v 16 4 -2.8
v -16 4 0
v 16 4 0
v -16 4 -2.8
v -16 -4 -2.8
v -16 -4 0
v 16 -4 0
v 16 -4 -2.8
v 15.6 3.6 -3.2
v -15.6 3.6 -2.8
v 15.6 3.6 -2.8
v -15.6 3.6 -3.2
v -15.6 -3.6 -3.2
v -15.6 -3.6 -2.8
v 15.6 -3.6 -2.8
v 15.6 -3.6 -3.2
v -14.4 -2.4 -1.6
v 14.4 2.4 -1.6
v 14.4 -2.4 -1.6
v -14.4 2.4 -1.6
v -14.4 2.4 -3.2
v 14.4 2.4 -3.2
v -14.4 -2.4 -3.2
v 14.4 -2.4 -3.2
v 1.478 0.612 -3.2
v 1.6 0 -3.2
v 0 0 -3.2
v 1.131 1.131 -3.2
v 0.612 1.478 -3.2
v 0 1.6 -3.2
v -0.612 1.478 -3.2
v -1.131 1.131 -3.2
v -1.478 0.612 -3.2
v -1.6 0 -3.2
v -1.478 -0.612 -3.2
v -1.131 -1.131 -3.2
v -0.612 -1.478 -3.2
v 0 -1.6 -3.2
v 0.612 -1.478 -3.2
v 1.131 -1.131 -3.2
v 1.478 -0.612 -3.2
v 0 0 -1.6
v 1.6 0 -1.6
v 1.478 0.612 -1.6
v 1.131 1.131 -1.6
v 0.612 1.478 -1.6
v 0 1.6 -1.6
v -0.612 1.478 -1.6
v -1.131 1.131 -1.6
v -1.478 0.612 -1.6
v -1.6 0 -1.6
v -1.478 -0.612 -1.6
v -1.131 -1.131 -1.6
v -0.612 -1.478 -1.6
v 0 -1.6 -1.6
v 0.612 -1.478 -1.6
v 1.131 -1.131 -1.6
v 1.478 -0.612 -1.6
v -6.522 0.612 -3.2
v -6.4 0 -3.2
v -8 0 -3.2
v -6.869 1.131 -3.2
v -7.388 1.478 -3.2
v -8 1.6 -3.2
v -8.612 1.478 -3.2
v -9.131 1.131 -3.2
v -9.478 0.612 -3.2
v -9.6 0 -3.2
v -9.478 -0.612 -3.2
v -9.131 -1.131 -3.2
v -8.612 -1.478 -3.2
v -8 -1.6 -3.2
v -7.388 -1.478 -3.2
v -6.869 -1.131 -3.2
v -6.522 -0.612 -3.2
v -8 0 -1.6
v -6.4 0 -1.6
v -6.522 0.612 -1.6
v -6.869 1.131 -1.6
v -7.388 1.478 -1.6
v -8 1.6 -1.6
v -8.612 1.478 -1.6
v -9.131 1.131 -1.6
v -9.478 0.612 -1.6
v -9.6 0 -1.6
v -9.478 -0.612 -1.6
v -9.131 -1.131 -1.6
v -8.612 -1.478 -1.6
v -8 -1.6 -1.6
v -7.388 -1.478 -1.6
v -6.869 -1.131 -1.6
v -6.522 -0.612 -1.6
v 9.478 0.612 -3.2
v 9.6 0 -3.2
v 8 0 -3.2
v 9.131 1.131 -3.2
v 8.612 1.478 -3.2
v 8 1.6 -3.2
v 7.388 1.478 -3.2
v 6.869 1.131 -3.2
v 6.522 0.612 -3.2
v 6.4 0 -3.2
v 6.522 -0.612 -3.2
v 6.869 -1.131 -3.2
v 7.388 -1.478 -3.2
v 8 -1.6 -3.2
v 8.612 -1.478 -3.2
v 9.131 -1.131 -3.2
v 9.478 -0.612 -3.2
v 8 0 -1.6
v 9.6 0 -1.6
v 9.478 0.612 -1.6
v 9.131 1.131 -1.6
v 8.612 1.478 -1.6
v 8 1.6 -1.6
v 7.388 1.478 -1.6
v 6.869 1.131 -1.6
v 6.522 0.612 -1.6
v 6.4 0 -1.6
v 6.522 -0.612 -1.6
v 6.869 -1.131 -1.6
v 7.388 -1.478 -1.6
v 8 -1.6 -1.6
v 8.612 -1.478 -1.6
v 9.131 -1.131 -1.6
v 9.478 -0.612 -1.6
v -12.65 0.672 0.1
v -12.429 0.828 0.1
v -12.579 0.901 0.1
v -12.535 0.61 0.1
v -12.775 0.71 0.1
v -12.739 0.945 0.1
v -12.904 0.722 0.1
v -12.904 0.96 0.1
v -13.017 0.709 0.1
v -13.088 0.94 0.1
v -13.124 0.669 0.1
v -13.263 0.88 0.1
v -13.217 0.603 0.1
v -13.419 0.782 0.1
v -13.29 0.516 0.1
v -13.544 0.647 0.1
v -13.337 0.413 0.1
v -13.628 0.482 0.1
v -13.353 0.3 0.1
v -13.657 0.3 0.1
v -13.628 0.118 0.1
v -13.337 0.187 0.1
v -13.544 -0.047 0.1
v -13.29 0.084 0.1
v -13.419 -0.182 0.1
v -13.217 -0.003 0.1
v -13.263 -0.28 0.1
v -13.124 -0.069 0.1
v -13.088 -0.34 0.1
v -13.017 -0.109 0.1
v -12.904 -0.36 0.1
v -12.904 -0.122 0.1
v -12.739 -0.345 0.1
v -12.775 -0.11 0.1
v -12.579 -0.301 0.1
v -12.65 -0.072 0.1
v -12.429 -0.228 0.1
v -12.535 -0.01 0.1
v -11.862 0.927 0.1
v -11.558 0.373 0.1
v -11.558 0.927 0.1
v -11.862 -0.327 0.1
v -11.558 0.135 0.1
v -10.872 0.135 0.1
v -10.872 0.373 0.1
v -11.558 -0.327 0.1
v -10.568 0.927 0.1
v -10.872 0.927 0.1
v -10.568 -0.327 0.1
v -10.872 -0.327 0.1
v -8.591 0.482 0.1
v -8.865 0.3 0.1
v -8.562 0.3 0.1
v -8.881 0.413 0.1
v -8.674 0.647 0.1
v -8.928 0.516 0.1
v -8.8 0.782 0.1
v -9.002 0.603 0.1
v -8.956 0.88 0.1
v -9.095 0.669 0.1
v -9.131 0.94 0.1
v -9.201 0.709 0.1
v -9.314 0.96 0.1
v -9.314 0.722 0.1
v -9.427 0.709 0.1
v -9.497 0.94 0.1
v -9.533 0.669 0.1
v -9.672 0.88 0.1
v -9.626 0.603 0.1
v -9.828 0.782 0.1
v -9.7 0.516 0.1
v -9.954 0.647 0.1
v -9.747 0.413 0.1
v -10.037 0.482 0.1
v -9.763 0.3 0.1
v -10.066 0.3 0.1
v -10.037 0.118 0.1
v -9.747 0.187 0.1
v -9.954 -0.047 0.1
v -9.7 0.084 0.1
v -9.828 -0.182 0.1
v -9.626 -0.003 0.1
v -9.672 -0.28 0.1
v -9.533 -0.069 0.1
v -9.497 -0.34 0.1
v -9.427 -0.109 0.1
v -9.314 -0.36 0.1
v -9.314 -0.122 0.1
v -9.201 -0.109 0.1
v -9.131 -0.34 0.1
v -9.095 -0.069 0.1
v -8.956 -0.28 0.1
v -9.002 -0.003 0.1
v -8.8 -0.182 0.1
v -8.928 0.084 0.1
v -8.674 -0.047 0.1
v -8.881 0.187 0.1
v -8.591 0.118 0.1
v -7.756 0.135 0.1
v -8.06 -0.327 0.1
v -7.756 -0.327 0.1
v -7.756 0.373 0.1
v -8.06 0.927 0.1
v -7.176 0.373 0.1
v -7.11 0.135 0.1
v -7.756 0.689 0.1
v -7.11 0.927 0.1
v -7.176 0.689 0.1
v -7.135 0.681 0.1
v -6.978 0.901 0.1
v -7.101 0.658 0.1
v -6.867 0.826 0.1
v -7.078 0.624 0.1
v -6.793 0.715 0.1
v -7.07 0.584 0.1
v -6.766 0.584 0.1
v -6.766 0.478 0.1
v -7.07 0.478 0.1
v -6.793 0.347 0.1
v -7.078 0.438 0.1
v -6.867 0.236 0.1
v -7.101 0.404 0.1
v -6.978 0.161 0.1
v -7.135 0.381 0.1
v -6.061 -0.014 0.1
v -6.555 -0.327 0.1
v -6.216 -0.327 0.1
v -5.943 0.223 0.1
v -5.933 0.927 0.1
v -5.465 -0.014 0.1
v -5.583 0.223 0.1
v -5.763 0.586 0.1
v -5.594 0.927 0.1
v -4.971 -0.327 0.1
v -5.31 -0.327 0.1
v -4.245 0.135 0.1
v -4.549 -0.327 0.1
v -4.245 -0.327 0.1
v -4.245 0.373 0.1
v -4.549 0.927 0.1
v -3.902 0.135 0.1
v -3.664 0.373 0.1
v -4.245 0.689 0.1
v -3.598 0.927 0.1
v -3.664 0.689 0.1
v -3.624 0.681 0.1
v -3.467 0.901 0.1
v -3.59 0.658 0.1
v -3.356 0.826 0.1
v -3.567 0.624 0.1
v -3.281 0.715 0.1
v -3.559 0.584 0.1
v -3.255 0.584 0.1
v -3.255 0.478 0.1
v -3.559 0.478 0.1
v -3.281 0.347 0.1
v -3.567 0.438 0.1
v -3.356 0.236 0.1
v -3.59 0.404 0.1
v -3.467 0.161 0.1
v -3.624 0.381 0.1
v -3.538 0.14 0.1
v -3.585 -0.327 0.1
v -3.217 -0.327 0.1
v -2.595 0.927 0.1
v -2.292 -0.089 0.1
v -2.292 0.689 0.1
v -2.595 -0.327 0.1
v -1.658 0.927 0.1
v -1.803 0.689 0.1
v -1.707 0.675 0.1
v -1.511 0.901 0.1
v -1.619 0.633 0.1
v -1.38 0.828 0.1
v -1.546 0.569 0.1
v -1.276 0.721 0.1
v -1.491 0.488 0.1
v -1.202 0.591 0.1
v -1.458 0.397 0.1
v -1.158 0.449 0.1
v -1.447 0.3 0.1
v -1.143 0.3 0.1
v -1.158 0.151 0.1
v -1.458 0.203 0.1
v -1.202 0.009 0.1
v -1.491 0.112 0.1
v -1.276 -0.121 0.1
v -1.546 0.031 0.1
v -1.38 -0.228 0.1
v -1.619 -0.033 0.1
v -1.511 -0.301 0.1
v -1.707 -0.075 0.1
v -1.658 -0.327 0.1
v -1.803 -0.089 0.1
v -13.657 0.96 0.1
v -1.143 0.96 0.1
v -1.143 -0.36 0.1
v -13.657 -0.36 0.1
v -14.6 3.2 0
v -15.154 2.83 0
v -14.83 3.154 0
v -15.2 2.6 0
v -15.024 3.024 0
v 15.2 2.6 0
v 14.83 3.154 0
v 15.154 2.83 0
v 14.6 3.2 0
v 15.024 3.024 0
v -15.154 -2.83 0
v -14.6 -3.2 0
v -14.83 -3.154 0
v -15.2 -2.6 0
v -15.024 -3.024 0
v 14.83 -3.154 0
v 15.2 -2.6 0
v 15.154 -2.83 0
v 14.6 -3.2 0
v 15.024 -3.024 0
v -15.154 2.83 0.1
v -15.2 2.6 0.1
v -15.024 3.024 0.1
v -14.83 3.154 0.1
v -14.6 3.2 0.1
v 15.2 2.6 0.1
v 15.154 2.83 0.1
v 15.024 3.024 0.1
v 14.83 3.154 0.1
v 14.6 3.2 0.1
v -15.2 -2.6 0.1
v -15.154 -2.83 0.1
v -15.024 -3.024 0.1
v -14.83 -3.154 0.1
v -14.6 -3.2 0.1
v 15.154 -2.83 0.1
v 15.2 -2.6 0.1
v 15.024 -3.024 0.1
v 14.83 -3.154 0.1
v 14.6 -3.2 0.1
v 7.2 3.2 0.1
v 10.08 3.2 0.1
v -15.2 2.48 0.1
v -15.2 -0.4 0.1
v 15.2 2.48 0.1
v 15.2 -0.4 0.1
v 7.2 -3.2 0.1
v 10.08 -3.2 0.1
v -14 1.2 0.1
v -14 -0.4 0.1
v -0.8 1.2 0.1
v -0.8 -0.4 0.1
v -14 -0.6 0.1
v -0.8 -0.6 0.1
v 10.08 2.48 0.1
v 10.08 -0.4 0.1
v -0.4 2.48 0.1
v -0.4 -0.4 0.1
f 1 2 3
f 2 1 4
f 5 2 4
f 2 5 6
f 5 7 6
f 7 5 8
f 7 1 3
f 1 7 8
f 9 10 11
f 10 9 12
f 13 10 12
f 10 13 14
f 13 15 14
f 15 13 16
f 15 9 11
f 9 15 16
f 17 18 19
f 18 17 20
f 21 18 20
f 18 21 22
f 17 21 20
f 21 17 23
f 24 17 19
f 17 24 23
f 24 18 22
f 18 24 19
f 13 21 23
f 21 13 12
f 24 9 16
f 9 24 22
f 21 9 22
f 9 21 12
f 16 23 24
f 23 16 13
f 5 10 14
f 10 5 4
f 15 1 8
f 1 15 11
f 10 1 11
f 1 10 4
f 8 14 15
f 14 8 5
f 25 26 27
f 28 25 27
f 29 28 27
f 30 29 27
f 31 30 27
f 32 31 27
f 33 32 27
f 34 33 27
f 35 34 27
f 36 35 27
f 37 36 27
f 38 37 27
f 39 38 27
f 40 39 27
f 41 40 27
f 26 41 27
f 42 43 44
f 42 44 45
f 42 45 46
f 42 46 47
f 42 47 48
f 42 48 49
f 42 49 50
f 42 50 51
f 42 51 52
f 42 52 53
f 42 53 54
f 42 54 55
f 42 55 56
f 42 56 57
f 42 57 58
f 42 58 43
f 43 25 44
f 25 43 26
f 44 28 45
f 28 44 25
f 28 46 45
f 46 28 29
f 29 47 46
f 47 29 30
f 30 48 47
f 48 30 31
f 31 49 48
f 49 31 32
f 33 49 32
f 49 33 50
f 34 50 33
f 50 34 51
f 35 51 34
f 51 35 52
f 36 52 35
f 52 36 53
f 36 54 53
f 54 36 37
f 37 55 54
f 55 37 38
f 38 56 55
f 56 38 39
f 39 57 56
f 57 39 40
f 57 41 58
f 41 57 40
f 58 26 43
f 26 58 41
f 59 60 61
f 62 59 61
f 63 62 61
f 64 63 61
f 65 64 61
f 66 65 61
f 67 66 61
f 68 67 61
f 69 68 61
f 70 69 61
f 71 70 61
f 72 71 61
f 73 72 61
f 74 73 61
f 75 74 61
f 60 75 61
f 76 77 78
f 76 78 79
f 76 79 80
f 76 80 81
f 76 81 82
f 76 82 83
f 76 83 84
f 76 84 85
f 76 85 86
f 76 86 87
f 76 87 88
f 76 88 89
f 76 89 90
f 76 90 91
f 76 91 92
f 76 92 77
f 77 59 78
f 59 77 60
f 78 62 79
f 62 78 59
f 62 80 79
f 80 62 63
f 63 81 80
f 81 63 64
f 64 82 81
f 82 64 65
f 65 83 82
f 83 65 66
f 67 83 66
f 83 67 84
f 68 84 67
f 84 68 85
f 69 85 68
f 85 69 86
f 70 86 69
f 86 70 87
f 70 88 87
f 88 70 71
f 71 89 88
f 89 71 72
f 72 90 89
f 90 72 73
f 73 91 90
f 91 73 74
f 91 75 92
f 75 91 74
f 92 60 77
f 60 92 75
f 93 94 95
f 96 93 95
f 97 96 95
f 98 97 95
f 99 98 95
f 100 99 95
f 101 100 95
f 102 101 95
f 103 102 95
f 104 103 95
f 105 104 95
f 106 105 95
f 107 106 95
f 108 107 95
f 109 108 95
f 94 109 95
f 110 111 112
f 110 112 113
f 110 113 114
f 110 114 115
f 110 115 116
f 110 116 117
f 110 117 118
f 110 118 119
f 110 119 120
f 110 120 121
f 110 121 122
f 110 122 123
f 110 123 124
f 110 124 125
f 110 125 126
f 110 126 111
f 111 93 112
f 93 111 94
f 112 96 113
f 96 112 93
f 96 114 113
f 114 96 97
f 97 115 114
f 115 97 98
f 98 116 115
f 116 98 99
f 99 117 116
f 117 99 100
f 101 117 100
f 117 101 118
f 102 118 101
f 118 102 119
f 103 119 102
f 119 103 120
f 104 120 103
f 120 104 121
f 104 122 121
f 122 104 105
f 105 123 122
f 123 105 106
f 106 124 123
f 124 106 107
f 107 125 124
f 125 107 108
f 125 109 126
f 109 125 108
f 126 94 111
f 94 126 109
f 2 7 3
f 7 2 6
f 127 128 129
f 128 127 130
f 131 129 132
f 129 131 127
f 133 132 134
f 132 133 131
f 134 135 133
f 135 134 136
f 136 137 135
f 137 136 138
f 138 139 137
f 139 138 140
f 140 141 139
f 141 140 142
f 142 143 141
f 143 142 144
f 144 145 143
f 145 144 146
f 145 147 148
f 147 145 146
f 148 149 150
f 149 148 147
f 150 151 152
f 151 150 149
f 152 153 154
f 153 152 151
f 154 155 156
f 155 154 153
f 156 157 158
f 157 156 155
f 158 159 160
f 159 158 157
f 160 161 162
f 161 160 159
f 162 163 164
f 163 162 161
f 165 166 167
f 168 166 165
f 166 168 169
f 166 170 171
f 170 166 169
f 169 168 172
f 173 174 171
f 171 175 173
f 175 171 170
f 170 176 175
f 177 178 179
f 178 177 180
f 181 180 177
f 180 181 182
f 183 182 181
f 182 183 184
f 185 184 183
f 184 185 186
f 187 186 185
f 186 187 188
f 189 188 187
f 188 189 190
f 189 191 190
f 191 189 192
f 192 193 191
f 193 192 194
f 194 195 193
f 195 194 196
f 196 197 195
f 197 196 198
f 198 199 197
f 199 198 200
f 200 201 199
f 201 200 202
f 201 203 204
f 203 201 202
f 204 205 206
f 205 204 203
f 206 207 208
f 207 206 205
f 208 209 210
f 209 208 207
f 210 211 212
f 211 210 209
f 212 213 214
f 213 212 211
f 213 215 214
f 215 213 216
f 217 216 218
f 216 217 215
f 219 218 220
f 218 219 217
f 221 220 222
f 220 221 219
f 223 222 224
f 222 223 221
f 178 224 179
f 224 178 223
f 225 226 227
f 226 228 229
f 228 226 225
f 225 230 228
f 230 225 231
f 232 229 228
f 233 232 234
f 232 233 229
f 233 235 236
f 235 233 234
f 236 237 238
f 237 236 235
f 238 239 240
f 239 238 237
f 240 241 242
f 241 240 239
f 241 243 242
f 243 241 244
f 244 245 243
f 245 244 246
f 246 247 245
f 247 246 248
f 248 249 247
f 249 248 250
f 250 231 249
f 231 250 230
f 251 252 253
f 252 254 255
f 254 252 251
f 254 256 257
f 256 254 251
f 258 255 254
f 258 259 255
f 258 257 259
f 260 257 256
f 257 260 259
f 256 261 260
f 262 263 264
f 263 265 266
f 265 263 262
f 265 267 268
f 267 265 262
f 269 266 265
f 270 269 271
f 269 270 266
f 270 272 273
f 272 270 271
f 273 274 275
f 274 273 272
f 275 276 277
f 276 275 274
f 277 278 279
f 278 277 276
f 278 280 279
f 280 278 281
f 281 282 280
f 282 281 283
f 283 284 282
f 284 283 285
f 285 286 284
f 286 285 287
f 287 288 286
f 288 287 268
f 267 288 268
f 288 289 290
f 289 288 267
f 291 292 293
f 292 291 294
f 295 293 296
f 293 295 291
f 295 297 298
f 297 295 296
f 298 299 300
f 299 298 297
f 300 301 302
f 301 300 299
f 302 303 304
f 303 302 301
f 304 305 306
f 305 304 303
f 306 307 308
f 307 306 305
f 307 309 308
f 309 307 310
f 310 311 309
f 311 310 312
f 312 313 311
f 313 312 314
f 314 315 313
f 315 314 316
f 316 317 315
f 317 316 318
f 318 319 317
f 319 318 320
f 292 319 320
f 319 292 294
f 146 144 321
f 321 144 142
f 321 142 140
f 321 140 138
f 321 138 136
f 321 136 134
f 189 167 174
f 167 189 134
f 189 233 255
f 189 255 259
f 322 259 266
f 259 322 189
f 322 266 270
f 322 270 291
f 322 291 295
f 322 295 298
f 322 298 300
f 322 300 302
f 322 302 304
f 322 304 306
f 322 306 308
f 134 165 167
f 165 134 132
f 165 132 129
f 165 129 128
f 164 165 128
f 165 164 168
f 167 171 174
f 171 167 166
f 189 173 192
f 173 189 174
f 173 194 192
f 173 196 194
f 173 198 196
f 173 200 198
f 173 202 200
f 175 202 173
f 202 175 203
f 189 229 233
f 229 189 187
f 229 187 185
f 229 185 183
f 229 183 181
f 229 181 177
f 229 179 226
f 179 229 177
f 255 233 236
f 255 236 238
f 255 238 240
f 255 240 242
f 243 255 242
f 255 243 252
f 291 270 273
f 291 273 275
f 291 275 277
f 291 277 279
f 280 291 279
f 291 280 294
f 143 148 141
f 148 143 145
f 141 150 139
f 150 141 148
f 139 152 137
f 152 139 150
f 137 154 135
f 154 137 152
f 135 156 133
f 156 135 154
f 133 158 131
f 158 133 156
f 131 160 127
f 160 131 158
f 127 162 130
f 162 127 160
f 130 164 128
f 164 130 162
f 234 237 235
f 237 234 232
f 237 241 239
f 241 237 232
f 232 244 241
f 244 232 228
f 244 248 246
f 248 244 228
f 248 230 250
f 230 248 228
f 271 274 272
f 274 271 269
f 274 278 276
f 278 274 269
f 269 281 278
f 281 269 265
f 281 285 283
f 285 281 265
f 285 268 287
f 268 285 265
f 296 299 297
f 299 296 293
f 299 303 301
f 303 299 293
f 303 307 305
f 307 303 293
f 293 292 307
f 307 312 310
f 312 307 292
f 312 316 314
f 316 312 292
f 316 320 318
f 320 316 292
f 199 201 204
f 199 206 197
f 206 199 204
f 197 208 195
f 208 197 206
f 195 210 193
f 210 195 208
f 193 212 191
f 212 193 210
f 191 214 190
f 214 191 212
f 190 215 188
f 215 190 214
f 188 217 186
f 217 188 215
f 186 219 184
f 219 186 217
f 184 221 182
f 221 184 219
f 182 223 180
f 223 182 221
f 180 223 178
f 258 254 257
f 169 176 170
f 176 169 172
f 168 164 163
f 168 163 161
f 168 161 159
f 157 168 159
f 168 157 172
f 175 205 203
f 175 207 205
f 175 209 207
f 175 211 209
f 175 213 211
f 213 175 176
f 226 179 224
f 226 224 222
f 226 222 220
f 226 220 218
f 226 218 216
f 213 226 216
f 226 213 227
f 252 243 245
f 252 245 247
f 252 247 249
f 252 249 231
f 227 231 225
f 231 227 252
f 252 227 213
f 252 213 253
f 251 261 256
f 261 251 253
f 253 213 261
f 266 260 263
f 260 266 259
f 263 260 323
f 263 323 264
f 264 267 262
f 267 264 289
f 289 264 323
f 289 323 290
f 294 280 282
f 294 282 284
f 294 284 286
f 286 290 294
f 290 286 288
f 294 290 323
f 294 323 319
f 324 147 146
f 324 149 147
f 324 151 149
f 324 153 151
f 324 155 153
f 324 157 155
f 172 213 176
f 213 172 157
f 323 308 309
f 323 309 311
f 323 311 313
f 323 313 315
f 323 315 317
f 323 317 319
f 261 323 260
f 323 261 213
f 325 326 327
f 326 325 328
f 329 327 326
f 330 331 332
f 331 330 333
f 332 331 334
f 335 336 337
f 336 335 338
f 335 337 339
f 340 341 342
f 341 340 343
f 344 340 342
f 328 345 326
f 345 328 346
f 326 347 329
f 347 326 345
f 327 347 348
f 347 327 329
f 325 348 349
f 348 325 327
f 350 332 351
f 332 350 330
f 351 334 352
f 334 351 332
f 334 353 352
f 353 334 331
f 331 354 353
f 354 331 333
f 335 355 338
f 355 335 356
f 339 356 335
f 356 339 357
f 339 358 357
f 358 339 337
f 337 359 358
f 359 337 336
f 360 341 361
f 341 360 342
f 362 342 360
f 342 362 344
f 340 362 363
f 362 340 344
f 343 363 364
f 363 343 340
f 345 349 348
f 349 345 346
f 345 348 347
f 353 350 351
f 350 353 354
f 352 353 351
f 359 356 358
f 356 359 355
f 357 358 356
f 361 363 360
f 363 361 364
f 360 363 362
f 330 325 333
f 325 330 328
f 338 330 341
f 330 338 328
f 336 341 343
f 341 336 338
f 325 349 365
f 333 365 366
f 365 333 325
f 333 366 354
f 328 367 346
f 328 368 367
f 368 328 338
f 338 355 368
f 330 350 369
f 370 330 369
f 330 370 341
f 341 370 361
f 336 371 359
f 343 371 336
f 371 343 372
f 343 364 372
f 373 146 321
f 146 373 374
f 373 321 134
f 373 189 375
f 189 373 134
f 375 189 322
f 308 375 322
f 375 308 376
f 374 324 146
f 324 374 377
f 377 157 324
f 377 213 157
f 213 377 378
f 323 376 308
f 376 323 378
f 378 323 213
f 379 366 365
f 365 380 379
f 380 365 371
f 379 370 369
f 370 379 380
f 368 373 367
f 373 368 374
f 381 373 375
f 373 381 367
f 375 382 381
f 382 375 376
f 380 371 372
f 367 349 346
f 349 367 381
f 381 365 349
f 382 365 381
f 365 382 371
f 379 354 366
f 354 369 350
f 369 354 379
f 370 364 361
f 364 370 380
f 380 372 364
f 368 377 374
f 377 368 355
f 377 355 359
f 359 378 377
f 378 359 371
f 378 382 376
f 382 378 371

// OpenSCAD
use <../lib.scad>
use <2431.scad>
use <6148328ax.scad>
function ldraw_lib__2431d10() = [
// 0 Tile  1 x  4 with White "CHOPARD" and Dark Grey Lines on White Background Left Sticker
// 0 Name: 2431d10.dat
// 0 Author: Vincent Messenet [Cheenzo]
// 0 !LDRAW_ORG Shortcut UPDATE 2026-05
// 0 !LICENSE Licensed under CC BY 4.0 : see CAreadme.txt
// 
// 0 BFC CERTIFY CCW
  [0,"BFC","CERTIFY"],
  [0,"BFC","CCW"],
// 
// 0 !CATEGORY Sticker Shortcut
// 
// 0 !KEYWORDS Bricklink 2431pb0553L, Porsche 919 Hybrid and 917K Pit Lane
// 0 !KEYWORDS set 75876, Speed Champions
// 
// 0 !HISTORY 2026-05-31 [OrionP] Official Update 2026-05
// 
// 1 16 0 0 0 1 0 0 0 1 0 0 0 1 2431.dat
  [1,16,0,0,0,1,0,0,0,1,0,0,0,1, ldraw_lib__2431()],
// 1 16 0 0 0 1 0 0 0 1 0 0 0 1 6148328ax.dat
  [1,16,0,0,0,1,0,0,0,1,0,0,0,1, ldraw_lib__6148328ax()],
];
module ldraw_lib__2431d10(step=0, col=false, unit=2/5, alt=false, line=0.2, solid=!$preview)
    makepoly(ldraw_lib__2431d10(), step=step, col=col, unit=unit, alt=alt, line=line, solid=solid);
ldraw_lib__2431d10(line=0.2);
